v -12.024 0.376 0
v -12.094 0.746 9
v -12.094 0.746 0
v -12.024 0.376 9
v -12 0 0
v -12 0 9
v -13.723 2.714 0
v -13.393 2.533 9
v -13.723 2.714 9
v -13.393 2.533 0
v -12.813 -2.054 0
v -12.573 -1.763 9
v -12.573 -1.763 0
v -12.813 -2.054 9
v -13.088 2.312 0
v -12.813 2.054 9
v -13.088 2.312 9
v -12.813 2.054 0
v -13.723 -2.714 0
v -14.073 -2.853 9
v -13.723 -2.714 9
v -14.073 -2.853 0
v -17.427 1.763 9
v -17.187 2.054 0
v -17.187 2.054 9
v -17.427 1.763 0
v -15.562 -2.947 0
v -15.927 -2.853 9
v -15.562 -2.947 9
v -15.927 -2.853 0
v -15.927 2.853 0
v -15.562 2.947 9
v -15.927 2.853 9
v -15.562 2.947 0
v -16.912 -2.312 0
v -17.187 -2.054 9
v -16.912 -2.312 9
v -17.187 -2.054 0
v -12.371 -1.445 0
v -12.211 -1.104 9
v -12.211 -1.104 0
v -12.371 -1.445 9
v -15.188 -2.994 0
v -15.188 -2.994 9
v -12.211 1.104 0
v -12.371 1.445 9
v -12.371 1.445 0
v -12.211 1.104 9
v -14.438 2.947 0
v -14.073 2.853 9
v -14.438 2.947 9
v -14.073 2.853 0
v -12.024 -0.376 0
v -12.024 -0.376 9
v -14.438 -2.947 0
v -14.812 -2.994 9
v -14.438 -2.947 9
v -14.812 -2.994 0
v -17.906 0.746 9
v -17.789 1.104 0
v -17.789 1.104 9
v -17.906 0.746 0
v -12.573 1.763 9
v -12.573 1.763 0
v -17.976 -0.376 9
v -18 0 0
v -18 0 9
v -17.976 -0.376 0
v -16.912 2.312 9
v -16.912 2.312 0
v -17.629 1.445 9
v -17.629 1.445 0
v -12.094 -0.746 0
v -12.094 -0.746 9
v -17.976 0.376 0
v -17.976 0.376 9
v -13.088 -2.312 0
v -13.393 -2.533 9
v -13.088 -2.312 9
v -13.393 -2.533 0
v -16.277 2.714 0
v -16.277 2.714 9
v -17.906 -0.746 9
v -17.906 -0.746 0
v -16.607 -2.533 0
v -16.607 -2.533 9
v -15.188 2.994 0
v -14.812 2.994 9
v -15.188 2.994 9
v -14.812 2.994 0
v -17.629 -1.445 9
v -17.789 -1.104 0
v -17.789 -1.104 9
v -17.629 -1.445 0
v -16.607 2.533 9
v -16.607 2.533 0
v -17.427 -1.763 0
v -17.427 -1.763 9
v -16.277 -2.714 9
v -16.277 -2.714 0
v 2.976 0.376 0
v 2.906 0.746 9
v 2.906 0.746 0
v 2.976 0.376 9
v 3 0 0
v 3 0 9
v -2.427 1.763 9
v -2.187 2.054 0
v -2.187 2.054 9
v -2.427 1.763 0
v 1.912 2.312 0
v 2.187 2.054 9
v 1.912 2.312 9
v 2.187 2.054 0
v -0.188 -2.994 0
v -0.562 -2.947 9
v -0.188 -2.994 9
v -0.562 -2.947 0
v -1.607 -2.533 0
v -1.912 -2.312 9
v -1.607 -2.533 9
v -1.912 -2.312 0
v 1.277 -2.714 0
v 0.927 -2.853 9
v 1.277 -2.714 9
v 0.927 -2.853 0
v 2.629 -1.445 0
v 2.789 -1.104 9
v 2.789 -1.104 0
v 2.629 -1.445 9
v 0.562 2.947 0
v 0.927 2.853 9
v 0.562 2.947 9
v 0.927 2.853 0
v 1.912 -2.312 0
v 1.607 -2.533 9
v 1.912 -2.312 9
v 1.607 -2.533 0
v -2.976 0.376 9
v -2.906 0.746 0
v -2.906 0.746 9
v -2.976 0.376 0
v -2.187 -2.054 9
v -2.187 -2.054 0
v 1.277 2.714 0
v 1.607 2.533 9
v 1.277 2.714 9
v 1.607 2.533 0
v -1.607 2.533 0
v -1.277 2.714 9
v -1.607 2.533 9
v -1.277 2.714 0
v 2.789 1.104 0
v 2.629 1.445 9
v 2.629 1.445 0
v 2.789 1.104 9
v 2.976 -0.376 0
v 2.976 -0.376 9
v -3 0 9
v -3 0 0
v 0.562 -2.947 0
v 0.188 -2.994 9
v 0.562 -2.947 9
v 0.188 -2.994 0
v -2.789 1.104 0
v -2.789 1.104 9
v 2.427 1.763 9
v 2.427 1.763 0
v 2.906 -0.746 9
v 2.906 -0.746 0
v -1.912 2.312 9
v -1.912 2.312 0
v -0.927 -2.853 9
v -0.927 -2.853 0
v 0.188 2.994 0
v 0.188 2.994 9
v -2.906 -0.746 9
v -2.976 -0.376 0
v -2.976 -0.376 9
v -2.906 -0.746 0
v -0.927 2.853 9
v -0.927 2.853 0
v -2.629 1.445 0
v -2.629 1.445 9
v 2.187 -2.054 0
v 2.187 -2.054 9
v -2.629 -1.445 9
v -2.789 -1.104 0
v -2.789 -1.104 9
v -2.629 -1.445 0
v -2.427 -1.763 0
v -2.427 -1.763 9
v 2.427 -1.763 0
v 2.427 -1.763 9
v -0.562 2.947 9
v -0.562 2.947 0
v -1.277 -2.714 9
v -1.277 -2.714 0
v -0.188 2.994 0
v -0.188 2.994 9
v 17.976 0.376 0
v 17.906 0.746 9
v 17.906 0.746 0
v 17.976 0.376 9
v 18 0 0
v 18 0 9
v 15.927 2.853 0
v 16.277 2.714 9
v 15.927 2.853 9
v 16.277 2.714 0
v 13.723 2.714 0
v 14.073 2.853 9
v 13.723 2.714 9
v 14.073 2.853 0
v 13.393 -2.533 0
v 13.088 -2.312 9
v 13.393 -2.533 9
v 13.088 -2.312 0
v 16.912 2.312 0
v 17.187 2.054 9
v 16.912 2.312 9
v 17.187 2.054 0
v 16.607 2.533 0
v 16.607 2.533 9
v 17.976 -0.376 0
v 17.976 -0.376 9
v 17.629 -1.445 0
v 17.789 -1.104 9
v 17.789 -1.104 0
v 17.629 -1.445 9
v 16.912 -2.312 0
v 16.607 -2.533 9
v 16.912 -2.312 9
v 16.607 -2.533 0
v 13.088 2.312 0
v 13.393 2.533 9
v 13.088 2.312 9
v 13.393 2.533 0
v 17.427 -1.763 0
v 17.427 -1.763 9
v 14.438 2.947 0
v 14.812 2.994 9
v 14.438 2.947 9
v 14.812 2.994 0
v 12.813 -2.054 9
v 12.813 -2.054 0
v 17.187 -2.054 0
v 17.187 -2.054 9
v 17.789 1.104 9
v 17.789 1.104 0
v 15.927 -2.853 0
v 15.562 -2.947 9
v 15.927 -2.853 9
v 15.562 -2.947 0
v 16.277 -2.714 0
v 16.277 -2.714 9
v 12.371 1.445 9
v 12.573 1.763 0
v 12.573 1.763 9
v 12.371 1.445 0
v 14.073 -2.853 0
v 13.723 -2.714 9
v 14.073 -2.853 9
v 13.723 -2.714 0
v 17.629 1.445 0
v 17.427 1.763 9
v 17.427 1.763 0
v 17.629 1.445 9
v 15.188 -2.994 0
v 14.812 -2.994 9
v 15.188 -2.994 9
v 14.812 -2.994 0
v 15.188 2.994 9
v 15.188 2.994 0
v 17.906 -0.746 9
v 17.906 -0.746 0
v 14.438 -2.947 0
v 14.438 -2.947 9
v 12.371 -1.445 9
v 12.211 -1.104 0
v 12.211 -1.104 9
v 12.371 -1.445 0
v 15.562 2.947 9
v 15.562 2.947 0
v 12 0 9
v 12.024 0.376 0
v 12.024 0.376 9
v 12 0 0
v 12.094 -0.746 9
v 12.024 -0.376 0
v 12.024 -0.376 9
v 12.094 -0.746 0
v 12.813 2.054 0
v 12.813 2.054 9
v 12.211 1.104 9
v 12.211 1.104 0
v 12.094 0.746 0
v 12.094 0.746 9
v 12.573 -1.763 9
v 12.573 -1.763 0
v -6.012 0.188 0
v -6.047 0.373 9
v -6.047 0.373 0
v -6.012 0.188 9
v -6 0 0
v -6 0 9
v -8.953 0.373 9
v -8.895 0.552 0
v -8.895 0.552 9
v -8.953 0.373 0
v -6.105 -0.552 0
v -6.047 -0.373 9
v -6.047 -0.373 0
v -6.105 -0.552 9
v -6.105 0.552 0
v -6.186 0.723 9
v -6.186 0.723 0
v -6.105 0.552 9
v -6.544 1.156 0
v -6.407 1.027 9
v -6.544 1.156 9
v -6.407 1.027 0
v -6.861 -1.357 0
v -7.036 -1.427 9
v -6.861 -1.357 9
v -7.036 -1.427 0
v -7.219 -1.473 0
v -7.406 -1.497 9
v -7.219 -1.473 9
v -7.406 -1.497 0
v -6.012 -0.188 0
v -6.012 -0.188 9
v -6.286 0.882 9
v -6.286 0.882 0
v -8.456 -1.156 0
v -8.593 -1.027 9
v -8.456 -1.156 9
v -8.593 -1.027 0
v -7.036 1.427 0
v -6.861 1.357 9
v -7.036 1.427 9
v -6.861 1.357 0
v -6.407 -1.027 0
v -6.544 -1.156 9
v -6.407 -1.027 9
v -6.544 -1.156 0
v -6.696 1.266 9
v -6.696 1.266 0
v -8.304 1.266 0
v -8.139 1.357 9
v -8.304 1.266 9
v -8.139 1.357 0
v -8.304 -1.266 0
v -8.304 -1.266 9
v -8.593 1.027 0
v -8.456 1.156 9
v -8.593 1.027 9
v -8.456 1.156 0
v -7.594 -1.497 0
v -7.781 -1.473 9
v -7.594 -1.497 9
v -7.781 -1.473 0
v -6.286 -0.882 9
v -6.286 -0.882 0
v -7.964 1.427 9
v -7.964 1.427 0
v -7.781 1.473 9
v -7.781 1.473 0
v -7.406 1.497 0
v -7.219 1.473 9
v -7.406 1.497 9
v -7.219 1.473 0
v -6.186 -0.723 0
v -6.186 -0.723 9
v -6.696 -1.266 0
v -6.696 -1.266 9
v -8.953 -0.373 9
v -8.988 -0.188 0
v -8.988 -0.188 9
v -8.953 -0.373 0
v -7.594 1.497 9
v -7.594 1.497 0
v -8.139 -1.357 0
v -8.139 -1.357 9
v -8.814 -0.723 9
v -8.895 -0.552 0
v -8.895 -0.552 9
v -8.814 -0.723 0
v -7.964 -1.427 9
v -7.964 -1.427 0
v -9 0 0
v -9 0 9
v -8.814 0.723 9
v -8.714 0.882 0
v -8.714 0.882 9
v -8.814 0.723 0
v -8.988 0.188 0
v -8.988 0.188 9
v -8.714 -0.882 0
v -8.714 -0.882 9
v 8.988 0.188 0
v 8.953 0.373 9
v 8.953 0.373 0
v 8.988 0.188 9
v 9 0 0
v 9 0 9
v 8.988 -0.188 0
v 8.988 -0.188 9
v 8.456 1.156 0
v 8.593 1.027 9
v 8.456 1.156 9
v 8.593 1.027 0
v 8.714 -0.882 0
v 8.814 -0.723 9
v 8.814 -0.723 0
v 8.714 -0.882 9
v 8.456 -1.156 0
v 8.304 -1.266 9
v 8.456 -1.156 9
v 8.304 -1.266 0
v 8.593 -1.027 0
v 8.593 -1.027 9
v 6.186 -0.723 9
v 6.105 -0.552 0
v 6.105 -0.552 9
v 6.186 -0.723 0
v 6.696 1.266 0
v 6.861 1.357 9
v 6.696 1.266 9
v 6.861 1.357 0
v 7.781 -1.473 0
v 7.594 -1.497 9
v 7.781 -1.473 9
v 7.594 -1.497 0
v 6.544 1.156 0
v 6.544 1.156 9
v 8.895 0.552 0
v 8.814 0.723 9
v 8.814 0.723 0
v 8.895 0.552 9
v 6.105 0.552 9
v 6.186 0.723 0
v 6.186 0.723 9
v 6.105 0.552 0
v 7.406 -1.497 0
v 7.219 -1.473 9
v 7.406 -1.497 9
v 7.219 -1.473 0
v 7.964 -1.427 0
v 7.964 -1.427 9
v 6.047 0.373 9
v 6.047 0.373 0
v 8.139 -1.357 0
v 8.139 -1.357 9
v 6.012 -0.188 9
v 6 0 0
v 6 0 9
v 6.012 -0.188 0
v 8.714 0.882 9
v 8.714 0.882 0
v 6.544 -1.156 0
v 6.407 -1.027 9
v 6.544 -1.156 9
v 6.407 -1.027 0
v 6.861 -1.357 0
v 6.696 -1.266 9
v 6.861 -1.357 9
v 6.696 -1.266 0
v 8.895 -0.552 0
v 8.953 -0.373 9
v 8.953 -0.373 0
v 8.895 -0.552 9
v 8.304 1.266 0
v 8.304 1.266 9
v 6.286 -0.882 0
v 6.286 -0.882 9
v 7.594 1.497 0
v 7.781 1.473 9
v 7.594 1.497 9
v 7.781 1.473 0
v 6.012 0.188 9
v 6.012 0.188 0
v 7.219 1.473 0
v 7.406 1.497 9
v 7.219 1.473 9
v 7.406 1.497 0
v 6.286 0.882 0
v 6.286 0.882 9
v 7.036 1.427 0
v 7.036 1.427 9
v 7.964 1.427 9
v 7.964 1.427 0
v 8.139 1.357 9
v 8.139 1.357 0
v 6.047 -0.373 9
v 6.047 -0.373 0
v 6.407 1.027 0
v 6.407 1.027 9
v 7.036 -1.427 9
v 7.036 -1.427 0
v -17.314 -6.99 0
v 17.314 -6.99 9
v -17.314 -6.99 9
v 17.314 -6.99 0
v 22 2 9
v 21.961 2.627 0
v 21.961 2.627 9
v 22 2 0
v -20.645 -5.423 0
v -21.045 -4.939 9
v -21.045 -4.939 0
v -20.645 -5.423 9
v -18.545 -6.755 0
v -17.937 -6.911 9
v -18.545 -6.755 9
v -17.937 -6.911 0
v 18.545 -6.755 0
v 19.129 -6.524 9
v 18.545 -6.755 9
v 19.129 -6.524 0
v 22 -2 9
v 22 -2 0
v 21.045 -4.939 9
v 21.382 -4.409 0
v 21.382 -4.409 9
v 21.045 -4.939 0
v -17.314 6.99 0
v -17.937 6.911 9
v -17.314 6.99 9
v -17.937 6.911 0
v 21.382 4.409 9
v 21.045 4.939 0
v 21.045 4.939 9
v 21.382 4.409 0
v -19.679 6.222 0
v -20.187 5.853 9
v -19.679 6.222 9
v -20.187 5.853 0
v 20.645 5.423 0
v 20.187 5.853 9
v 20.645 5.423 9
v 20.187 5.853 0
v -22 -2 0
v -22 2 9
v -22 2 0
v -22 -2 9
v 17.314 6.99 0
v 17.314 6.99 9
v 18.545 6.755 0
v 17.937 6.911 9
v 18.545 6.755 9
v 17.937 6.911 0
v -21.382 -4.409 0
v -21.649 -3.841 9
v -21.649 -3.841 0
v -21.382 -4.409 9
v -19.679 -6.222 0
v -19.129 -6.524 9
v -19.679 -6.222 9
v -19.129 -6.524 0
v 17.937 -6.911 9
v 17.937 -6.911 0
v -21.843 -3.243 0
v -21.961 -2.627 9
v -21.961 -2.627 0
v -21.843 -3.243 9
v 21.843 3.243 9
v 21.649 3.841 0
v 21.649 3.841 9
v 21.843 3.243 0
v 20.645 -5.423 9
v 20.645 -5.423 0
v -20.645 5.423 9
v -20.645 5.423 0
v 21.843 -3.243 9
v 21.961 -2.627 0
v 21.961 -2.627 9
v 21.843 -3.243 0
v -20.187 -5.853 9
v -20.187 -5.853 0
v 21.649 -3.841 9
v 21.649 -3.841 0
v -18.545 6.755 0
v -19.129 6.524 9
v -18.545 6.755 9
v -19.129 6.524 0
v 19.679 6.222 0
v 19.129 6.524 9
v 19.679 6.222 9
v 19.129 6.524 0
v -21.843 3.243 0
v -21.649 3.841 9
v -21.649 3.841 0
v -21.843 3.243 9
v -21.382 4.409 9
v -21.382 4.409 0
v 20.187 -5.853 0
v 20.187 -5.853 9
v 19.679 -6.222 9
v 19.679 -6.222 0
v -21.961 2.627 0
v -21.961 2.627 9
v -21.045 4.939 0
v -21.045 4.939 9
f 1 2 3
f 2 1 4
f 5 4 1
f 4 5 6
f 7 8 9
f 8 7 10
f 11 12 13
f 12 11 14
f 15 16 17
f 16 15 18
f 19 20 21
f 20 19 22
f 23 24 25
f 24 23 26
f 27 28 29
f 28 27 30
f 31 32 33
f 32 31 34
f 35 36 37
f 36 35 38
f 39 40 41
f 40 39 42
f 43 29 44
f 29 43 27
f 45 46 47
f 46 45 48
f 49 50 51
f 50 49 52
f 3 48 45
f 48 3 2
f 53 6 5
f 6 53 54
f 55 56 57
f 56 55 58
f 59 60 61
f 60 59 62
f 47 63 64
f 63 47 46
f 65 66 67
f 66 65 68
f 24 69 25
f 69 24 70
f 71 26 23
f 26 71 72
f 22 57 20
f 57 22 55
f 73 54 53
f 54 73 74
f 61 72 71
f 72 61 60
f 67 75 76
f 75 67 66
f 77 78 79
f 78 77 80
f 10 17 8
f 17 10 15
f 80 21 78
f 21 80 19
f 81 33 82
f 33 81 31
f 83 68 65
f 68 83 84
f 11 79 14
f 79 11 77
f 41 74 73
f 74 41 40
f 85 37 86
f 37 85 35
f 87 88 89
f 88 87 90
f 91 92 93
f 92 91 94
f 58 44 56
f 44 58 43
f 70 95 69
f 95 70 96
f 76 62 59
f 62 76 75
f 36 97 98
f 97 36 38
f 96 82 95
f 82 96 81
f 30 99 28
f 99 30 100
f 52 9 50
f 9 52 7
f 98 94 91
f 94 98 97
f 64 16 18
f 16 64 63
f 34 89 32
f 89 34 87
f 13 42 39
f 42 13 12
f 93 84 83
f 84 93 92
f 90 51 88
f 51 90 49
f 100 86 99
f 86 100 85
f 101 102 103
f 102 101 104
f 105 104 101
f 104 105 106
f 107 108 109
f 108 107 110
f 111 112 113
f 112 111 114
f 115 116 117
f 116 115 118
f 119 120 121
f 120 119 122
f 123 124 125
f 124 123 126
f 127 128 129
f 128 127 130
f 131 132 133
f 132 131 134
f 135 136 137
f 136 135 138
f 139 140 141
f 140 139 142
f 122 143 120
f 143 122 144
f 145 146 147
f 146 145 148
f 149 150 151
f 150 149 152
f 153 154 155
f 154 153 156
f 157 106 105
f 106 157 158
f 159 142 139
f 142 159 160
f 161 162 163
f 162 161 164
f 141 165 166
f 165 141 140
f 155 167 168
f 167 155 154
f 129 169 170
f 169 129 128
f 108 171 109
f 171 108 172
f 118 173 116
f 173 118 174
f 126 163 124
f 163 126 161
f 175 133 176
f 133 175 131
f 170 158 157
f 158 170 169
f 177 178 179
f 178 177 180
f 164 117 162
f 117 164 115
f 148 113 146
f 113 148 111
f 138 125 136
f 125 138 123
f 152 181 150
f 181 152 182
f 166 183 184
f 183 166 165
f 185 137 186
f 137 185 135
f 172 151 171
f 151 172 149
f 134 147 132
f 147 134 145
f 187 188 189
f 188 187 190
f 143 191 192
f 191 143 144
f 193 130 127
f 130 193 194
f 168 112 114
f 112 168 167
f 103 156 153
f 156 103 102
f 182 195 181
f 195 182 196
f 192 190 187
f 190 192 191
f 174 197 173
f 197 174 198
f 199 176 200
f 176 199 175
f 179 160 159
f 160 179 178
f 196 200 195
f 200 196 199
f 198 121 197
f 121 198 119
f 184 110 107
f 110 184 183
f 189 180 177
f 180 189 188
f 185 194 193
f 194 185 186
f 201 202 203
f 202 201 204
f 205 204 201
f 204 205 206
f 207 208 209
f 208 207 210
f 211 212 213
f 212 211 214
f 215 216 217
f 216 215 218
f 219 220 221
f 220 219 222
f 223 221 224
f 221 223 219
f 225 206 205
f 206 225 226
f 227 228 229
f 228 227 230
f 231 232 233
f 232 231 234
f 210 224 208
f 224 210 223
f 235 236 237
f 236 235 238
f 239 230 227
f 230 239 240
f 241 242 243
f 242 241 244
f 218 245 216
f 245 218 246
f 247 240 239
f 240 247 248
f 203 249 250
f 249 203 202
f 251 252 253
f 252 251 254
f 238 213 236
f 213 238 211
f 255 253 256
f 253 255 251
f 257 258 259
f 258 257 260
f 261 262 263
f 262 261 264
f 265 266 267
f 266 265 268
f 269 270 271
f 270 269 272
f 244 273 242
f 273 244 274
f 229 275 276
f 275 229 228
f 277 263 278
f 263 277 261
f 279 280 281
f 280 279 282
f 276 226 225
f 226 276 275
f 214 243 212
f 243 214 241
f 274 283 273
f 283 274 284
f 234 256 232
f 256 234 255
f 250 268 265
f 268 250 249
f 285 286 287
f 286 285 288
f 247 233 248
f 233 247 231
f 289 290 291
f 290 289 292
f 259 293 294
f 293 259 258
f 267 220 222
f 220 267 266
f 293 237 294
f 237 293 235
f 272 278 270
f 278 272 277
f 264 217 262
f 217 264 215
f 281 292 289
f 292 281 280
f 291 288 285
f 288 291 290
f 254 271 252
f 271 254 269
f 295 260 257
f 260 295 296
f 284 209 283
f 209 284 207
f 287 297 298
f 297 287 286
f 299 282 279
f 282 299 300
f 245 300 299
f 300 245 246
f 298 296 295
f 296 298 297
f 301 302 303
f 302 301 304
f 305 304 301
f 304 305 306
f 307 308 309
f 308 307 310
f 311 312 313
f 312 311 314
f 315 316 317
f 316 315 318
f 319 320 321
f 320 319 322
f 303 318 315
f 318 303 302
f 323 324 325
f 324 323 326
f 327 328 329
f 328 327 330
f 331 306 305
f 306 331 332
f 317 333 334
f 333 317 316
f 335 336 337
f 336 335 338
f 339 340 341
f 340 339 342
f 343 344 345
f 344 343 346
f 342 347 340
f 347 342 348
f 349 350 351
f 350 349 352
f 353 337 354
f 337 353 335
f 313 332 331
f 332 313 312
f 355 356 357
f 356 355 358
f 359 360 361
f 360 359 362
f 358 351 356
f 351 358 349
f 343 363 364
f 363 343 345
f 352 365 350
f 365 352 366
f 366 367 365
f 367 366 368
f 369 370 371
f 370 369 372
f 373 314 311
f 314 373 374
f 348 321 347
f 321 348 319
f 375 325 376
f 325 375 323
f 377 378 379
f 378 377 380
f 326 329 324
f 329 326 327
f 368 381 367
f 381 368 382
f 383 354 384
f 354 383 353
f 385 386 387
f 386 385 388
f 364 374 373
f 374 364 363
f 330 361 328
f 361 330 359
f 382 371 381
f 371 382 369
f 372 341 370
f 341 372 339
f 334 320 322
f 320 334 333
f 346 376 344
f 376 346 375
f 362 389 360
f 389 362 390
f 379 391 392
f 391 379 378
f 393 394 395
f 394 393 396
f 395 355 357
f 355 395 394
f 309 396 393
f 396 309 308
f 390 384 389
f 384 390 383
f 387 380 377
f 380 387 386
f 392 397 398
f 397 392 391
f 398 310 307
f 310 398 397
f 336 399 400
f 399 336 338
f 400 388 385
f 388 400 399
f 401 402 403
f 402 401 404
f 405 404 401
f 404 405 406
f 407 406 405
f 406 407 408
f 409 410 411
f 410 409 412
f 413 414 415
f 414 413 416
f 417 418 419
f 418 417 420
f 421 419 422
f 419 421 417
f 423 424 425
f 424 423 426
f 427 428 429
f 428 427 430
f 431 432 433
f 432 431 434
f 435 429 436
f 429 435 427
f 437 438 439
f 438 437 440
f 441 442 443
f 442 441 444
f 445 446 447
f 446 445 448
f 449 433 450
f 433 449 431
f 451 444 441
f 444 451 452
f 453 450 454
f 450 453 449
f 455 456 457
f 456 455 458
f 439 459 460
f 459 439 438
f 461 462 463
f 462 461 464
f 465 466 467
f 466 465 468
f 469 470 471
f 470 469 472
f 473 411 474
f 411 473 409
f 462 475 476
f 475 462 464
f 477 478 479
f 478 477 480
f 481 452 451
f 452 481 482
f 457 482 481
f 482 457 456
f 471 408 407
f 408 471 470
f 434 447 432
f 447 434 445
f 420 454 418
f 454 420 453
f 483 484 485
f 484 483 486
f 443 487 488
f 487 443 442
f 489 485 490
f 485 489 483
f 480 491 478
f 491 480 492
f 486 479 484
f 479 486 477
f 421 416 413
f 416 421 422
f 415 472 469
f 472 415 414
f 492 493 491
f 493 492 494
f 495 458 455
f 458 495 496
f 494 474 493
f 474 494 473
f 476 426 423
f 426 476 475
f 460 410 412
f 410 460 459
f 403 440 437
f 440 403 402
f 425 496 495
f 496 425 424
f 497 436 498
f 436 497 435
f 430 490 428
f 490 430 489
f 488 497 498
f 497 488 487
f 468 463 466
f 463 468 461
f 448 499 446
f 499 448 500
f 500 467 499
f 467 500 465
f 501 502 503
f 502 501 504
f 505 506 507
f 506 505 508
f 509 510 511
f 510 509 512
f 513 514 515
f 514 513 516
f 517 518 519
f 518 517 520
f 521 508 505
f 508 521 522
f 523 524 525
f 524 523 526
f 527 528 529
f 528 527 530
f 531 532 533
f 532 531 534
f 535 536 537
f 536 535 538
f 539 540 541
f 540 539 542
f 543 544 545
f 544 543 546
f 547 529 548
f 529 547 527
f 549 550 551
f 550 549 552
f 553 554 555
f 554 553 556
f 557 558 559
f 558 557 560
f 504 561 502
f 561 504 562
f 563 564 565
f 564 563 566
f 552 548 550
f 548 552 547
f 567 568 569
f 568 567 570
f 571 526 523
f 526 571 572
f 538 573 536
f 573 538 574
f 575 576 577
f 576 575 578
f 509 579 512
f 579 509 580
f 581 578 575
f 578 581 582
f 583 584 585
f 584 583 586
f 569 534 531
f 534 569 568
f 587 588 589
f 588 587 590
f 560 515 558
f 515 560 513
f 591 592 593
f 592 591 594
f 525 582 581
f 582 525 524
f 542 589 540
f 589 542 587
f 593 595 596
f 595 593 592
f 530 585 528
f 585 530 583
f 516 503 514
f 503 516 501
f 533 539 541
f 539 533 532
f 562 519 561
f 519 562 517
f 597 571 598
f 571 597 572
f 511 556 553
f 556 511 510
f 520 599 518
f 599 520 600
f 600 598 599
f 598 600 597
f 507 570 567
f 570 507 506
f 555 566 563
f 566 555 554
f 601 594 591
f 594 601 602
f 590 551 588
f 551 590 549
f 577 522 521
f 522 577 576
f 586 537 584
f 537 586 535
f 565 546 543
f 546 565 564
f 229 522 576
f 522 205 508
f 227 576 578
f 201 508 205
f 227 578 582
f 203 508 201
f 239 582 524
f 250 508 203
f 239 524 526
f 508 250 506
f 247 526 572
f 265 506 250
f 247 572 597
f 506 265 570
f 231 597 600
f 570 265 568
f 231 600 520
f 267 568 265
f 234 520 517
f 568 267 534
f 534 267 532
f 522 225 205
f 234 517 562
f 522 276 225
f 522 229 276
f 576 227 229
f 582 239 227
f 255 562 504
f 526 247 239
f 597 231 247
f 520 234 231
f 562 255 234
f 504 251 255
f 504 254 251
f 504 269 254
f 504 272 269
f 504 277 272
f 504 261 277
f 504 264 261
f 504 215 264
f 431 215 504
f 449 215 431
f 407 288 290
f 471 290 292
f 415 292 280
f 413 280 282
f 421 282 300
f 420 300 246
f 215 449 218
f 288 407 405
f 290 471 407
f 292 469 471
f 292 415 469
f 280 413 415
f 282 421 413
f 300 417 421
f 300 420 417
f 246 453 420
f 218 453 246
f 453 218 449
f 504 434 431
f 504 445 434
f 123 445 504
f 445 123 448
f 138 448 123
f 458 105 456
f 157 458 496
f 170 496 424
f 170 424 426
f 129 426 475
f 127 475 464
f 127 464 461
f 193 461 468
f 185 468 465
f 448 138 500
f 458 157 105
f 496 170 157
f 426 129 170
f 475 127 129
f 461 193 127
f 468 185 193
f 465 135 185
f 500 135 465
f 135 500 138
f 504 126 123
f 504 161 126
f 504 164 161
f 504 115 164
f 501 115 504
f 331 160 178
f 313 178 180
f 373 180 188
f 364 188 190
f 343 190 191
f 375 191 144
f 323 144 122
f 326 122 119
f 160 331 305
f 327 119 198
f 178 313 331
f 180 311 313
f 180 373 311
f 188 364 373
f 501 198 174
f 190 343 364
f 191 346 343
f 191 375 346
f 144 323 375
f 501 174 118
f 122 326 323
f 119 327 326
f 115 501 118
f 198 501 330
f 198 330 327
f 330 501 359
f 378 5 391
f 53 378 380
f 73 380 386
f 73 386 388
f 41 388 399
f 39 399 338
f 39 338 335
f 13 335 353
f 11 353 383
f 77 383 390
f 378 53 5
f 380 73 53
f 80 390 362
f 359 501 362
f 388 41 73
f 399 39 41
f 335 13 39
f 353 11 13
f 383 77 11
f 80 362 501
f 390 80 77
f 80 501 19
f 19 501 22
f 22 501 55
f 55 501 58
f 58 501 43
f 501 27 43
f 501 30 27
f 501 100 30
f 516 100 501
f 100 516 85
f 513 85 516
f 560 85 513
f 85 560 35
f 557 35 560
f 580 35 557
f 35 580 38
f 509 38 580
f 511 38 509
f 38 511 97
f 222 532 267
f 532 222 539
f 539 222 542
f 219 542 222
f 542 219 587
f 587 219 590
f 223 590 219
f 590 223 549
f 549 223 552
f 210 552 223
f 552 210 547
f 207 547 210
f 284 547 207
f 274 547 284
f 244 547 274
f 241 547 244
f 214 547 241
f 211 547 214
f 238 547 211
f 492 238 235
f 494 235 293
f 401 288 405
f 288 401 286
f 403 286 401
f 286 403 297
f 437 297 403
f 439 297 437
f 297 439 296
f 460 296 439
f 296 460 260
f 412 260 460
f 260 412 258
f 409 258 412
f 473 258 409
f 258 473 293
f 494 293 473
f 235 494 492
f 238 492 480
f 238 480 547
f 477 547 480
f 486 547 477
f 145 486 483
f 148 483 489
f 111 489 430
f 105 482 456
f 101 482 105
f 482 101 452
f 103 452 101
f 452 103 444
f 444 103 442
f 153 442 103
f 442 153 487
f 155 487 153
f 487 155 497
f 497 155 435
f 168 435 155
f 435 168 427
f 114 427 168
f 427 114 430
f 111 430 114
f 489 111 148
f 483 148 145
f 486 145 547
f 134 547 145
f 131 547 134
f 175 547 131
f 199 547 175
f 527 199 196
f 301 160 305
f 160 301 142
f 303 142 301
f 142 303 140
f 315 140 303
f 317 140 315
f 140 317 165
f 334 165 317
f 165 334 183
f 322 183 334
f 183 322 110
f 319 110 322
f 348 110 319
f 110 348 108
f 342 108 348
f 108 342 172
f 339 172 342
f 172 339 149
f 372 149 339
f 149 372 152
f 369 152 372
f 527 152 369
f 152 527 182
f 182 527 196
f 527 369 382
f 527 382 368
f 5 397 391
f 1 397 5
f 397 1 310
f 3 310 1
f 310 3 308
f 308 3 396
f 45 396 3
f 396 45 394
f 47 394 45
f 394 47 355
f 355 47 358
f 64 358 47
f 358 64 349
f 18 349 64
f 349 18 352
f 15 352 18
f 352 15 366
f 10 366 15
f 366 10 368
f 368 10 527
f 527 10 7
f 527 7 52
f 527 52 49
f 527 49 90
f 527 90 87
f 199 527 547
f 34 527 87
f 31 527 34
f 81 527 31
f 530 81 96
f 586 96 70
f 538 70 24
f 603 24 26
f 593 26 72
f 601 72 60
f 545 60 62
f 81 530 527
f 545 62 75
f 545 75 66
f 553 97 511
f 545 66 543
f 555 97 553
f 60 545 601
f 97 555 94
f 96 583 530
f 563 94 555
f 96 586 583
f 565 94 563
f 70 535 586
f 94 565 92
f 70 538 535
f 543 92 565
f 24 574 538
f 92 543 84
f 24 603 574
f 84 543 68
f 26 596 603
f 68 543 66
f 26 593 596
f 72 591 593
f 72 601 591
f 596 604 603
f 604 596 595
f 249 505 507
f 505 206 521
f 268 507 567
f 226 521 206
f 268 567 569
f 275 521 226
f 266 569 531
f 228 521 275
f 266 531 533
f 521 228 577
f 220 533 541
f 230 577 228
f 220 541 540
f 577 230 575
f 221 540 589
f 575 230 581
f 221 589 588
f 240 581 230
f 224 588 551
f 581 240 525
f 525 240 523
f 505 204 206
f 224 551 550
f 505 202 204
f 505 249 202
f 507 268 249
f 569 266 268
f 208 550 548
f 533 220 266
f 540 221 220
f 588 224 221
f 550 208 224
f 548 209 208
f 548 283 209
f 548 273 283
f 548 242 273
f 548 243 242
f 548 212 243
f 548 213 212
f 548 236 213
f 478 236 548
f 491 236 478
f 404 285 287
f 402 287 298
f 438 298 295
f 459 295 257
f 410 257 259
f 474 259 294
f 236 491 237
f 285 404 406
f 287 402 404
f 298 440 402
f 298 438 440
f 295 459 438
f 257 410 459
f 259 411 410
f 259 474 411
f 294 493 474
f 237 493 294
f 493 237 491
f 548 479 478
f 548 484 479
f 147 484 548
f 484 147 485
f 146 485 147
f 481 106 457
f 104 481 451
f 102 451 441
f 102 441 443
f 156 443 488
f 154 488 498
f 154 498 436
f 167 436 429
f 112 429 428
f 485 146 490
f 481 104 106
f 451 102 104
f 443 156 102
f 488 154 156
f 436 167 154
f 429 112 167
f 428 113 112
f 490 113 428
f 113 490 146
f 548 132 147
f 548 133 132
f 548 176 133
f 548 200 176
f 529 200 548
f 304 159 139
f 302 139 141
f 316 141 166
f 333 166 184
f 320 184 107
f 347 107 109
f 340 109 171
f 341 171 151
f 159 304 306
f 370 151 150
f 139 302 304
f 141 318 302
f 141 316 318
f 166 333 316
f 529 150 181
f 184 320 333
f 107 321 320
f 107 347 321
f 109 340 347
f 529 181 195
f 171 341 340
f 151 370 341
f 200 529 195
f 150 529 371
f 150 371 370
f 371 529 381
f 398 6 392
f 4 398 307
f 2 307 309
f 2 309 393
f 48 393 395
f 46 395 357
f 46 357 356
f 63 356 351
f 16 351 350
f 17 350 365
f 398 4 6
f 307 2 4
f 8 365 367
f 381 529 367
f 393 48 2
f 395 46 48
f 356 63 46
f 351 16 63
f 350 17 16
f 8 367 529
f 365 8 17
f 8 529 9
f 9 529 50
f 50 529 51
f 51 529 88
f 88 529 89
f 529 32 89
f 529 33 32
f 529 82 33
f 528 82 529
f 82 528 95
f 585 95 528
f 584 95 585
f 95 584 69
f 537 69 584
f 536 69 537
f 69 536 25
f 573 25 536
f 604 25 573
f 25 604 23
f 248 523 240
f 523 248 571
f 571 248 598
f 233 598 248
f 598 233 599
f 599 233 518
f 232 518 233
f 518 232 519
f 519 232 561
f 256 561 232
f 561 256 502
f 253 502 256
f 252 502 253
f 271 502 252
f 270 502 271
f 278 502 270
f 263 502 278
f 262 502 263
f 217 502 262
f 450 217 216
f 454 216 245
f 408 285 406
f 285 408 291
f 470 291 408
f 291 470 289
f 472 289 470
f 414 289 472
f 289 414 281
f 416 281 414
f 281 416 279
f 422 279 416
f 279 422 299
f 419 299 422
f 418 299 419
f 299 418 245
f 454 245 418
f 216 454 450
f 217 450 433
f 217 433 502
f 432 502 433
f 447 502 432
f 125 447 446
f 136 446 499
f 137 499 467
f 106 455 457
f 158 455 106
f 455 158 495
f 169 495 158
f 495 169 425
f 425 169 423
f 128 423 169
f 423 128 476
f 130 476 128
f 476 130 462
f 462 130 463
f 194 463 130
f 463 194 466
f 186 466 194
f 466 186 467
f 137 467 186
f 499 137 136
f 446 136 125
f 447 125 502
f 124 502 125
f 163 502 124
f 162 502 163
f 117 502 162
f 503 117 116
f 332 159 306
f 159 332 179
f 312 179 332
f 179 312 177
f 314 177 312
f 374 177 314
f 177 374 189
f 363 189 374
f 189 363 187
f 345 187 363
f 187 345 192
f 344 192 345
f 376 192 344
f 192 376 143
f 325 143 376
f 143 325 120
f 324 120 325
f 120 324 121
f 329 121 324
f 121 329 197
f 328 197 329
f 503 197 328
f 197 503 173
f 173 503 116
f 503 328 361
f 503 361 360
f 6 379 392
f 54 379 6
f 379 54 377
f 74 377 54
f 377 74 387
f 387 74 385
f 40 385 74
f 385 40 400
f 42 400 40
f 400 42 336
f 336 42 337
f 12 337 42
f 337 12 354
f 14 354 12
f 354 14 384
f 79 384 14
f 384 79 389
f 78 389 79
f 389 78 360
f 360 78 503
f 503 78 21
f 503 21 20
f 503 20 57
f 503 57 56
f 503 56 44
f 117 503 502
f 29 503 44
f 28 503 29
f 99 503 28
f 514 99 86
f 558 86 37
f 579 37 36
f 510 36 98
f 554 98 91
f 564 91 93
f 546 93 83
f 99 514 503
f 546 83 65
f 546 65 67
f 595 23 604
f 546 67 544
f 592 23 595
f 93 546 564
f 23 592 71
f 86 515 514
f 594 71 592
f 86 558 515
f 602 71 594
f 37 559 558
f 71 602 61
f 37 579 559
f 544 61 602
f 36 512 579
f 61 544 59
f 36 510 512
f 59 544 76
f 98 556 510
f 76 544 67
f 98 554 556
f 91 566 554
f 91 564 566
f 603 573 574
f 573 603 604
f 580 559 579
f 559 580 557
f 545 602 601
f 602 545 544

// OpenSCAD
$fn = 50;


difference() {
	union() {
		hull() {
			translate(v = [-17.0000000000, 2.0000000000, 0]) {
				cylinder(h = 9, r = 5);
			}
			translate(v = [17.0000000000, 2.0000000000, 0]) {
				cylinder(h = 9, r = 5);
			}
			translate(v = [-17.0000000000, -2.0000000000, 0]) {
				cylinder(h = 9, r = 5);
			}
			translate(v = [17.0000000000, -2.0000000000, 0]) {
				cylinder(h = 9, r = 5);
			}
		}
	}
	union() {
		translate(v = [-15.0000000000, 0.0000000000, 0]) {
			translate(v = [0, 0, -100]) {
				cylinder(h = 200, r = 3.0000000000);
			}
		}
		translate(v = [0, 0, -100]) {
			cylinder(h = 200, r = 3.0000000000);
		}
		translate(v = [15.0000000000, 0.0000000000, 0]) {
			translate(v = [0, 0, -100]) {
				cylinder(h = 200, r = 3.0000000000);
			}
		}
		translate(v = [-15.0000000000, 0.0000000000, 0]) {
			translate(v = [0, 0, -100]) {
				cylinder(h = 200, r = 1.5000000000);
			}
		}
		translate(v = [-7.5000000000, 0.0000000000, 0]) {
			translate(v = [0, 0, -100]) {
				cylinder(h = 200, r = 1.5000000000);
			}
		}
		translate(v = [0, 0, -100]) {
			cylinder(h = 200, r = 1.5000000000);
		}
		translate(v = [7.5000000000, 0.0000000000, 0]) {
			translate(v = [0, 0, -100]) {
				cylinder(h = 200, r = 1.5000000000);
			}
		}
		translate(v = [15.0000000000, 0.0000000000, 0]) {
			translate(v = [0, 0, -100]) {
				cylinder(h = 200, r = 1.5000000000);
			}
		}
	}
}
